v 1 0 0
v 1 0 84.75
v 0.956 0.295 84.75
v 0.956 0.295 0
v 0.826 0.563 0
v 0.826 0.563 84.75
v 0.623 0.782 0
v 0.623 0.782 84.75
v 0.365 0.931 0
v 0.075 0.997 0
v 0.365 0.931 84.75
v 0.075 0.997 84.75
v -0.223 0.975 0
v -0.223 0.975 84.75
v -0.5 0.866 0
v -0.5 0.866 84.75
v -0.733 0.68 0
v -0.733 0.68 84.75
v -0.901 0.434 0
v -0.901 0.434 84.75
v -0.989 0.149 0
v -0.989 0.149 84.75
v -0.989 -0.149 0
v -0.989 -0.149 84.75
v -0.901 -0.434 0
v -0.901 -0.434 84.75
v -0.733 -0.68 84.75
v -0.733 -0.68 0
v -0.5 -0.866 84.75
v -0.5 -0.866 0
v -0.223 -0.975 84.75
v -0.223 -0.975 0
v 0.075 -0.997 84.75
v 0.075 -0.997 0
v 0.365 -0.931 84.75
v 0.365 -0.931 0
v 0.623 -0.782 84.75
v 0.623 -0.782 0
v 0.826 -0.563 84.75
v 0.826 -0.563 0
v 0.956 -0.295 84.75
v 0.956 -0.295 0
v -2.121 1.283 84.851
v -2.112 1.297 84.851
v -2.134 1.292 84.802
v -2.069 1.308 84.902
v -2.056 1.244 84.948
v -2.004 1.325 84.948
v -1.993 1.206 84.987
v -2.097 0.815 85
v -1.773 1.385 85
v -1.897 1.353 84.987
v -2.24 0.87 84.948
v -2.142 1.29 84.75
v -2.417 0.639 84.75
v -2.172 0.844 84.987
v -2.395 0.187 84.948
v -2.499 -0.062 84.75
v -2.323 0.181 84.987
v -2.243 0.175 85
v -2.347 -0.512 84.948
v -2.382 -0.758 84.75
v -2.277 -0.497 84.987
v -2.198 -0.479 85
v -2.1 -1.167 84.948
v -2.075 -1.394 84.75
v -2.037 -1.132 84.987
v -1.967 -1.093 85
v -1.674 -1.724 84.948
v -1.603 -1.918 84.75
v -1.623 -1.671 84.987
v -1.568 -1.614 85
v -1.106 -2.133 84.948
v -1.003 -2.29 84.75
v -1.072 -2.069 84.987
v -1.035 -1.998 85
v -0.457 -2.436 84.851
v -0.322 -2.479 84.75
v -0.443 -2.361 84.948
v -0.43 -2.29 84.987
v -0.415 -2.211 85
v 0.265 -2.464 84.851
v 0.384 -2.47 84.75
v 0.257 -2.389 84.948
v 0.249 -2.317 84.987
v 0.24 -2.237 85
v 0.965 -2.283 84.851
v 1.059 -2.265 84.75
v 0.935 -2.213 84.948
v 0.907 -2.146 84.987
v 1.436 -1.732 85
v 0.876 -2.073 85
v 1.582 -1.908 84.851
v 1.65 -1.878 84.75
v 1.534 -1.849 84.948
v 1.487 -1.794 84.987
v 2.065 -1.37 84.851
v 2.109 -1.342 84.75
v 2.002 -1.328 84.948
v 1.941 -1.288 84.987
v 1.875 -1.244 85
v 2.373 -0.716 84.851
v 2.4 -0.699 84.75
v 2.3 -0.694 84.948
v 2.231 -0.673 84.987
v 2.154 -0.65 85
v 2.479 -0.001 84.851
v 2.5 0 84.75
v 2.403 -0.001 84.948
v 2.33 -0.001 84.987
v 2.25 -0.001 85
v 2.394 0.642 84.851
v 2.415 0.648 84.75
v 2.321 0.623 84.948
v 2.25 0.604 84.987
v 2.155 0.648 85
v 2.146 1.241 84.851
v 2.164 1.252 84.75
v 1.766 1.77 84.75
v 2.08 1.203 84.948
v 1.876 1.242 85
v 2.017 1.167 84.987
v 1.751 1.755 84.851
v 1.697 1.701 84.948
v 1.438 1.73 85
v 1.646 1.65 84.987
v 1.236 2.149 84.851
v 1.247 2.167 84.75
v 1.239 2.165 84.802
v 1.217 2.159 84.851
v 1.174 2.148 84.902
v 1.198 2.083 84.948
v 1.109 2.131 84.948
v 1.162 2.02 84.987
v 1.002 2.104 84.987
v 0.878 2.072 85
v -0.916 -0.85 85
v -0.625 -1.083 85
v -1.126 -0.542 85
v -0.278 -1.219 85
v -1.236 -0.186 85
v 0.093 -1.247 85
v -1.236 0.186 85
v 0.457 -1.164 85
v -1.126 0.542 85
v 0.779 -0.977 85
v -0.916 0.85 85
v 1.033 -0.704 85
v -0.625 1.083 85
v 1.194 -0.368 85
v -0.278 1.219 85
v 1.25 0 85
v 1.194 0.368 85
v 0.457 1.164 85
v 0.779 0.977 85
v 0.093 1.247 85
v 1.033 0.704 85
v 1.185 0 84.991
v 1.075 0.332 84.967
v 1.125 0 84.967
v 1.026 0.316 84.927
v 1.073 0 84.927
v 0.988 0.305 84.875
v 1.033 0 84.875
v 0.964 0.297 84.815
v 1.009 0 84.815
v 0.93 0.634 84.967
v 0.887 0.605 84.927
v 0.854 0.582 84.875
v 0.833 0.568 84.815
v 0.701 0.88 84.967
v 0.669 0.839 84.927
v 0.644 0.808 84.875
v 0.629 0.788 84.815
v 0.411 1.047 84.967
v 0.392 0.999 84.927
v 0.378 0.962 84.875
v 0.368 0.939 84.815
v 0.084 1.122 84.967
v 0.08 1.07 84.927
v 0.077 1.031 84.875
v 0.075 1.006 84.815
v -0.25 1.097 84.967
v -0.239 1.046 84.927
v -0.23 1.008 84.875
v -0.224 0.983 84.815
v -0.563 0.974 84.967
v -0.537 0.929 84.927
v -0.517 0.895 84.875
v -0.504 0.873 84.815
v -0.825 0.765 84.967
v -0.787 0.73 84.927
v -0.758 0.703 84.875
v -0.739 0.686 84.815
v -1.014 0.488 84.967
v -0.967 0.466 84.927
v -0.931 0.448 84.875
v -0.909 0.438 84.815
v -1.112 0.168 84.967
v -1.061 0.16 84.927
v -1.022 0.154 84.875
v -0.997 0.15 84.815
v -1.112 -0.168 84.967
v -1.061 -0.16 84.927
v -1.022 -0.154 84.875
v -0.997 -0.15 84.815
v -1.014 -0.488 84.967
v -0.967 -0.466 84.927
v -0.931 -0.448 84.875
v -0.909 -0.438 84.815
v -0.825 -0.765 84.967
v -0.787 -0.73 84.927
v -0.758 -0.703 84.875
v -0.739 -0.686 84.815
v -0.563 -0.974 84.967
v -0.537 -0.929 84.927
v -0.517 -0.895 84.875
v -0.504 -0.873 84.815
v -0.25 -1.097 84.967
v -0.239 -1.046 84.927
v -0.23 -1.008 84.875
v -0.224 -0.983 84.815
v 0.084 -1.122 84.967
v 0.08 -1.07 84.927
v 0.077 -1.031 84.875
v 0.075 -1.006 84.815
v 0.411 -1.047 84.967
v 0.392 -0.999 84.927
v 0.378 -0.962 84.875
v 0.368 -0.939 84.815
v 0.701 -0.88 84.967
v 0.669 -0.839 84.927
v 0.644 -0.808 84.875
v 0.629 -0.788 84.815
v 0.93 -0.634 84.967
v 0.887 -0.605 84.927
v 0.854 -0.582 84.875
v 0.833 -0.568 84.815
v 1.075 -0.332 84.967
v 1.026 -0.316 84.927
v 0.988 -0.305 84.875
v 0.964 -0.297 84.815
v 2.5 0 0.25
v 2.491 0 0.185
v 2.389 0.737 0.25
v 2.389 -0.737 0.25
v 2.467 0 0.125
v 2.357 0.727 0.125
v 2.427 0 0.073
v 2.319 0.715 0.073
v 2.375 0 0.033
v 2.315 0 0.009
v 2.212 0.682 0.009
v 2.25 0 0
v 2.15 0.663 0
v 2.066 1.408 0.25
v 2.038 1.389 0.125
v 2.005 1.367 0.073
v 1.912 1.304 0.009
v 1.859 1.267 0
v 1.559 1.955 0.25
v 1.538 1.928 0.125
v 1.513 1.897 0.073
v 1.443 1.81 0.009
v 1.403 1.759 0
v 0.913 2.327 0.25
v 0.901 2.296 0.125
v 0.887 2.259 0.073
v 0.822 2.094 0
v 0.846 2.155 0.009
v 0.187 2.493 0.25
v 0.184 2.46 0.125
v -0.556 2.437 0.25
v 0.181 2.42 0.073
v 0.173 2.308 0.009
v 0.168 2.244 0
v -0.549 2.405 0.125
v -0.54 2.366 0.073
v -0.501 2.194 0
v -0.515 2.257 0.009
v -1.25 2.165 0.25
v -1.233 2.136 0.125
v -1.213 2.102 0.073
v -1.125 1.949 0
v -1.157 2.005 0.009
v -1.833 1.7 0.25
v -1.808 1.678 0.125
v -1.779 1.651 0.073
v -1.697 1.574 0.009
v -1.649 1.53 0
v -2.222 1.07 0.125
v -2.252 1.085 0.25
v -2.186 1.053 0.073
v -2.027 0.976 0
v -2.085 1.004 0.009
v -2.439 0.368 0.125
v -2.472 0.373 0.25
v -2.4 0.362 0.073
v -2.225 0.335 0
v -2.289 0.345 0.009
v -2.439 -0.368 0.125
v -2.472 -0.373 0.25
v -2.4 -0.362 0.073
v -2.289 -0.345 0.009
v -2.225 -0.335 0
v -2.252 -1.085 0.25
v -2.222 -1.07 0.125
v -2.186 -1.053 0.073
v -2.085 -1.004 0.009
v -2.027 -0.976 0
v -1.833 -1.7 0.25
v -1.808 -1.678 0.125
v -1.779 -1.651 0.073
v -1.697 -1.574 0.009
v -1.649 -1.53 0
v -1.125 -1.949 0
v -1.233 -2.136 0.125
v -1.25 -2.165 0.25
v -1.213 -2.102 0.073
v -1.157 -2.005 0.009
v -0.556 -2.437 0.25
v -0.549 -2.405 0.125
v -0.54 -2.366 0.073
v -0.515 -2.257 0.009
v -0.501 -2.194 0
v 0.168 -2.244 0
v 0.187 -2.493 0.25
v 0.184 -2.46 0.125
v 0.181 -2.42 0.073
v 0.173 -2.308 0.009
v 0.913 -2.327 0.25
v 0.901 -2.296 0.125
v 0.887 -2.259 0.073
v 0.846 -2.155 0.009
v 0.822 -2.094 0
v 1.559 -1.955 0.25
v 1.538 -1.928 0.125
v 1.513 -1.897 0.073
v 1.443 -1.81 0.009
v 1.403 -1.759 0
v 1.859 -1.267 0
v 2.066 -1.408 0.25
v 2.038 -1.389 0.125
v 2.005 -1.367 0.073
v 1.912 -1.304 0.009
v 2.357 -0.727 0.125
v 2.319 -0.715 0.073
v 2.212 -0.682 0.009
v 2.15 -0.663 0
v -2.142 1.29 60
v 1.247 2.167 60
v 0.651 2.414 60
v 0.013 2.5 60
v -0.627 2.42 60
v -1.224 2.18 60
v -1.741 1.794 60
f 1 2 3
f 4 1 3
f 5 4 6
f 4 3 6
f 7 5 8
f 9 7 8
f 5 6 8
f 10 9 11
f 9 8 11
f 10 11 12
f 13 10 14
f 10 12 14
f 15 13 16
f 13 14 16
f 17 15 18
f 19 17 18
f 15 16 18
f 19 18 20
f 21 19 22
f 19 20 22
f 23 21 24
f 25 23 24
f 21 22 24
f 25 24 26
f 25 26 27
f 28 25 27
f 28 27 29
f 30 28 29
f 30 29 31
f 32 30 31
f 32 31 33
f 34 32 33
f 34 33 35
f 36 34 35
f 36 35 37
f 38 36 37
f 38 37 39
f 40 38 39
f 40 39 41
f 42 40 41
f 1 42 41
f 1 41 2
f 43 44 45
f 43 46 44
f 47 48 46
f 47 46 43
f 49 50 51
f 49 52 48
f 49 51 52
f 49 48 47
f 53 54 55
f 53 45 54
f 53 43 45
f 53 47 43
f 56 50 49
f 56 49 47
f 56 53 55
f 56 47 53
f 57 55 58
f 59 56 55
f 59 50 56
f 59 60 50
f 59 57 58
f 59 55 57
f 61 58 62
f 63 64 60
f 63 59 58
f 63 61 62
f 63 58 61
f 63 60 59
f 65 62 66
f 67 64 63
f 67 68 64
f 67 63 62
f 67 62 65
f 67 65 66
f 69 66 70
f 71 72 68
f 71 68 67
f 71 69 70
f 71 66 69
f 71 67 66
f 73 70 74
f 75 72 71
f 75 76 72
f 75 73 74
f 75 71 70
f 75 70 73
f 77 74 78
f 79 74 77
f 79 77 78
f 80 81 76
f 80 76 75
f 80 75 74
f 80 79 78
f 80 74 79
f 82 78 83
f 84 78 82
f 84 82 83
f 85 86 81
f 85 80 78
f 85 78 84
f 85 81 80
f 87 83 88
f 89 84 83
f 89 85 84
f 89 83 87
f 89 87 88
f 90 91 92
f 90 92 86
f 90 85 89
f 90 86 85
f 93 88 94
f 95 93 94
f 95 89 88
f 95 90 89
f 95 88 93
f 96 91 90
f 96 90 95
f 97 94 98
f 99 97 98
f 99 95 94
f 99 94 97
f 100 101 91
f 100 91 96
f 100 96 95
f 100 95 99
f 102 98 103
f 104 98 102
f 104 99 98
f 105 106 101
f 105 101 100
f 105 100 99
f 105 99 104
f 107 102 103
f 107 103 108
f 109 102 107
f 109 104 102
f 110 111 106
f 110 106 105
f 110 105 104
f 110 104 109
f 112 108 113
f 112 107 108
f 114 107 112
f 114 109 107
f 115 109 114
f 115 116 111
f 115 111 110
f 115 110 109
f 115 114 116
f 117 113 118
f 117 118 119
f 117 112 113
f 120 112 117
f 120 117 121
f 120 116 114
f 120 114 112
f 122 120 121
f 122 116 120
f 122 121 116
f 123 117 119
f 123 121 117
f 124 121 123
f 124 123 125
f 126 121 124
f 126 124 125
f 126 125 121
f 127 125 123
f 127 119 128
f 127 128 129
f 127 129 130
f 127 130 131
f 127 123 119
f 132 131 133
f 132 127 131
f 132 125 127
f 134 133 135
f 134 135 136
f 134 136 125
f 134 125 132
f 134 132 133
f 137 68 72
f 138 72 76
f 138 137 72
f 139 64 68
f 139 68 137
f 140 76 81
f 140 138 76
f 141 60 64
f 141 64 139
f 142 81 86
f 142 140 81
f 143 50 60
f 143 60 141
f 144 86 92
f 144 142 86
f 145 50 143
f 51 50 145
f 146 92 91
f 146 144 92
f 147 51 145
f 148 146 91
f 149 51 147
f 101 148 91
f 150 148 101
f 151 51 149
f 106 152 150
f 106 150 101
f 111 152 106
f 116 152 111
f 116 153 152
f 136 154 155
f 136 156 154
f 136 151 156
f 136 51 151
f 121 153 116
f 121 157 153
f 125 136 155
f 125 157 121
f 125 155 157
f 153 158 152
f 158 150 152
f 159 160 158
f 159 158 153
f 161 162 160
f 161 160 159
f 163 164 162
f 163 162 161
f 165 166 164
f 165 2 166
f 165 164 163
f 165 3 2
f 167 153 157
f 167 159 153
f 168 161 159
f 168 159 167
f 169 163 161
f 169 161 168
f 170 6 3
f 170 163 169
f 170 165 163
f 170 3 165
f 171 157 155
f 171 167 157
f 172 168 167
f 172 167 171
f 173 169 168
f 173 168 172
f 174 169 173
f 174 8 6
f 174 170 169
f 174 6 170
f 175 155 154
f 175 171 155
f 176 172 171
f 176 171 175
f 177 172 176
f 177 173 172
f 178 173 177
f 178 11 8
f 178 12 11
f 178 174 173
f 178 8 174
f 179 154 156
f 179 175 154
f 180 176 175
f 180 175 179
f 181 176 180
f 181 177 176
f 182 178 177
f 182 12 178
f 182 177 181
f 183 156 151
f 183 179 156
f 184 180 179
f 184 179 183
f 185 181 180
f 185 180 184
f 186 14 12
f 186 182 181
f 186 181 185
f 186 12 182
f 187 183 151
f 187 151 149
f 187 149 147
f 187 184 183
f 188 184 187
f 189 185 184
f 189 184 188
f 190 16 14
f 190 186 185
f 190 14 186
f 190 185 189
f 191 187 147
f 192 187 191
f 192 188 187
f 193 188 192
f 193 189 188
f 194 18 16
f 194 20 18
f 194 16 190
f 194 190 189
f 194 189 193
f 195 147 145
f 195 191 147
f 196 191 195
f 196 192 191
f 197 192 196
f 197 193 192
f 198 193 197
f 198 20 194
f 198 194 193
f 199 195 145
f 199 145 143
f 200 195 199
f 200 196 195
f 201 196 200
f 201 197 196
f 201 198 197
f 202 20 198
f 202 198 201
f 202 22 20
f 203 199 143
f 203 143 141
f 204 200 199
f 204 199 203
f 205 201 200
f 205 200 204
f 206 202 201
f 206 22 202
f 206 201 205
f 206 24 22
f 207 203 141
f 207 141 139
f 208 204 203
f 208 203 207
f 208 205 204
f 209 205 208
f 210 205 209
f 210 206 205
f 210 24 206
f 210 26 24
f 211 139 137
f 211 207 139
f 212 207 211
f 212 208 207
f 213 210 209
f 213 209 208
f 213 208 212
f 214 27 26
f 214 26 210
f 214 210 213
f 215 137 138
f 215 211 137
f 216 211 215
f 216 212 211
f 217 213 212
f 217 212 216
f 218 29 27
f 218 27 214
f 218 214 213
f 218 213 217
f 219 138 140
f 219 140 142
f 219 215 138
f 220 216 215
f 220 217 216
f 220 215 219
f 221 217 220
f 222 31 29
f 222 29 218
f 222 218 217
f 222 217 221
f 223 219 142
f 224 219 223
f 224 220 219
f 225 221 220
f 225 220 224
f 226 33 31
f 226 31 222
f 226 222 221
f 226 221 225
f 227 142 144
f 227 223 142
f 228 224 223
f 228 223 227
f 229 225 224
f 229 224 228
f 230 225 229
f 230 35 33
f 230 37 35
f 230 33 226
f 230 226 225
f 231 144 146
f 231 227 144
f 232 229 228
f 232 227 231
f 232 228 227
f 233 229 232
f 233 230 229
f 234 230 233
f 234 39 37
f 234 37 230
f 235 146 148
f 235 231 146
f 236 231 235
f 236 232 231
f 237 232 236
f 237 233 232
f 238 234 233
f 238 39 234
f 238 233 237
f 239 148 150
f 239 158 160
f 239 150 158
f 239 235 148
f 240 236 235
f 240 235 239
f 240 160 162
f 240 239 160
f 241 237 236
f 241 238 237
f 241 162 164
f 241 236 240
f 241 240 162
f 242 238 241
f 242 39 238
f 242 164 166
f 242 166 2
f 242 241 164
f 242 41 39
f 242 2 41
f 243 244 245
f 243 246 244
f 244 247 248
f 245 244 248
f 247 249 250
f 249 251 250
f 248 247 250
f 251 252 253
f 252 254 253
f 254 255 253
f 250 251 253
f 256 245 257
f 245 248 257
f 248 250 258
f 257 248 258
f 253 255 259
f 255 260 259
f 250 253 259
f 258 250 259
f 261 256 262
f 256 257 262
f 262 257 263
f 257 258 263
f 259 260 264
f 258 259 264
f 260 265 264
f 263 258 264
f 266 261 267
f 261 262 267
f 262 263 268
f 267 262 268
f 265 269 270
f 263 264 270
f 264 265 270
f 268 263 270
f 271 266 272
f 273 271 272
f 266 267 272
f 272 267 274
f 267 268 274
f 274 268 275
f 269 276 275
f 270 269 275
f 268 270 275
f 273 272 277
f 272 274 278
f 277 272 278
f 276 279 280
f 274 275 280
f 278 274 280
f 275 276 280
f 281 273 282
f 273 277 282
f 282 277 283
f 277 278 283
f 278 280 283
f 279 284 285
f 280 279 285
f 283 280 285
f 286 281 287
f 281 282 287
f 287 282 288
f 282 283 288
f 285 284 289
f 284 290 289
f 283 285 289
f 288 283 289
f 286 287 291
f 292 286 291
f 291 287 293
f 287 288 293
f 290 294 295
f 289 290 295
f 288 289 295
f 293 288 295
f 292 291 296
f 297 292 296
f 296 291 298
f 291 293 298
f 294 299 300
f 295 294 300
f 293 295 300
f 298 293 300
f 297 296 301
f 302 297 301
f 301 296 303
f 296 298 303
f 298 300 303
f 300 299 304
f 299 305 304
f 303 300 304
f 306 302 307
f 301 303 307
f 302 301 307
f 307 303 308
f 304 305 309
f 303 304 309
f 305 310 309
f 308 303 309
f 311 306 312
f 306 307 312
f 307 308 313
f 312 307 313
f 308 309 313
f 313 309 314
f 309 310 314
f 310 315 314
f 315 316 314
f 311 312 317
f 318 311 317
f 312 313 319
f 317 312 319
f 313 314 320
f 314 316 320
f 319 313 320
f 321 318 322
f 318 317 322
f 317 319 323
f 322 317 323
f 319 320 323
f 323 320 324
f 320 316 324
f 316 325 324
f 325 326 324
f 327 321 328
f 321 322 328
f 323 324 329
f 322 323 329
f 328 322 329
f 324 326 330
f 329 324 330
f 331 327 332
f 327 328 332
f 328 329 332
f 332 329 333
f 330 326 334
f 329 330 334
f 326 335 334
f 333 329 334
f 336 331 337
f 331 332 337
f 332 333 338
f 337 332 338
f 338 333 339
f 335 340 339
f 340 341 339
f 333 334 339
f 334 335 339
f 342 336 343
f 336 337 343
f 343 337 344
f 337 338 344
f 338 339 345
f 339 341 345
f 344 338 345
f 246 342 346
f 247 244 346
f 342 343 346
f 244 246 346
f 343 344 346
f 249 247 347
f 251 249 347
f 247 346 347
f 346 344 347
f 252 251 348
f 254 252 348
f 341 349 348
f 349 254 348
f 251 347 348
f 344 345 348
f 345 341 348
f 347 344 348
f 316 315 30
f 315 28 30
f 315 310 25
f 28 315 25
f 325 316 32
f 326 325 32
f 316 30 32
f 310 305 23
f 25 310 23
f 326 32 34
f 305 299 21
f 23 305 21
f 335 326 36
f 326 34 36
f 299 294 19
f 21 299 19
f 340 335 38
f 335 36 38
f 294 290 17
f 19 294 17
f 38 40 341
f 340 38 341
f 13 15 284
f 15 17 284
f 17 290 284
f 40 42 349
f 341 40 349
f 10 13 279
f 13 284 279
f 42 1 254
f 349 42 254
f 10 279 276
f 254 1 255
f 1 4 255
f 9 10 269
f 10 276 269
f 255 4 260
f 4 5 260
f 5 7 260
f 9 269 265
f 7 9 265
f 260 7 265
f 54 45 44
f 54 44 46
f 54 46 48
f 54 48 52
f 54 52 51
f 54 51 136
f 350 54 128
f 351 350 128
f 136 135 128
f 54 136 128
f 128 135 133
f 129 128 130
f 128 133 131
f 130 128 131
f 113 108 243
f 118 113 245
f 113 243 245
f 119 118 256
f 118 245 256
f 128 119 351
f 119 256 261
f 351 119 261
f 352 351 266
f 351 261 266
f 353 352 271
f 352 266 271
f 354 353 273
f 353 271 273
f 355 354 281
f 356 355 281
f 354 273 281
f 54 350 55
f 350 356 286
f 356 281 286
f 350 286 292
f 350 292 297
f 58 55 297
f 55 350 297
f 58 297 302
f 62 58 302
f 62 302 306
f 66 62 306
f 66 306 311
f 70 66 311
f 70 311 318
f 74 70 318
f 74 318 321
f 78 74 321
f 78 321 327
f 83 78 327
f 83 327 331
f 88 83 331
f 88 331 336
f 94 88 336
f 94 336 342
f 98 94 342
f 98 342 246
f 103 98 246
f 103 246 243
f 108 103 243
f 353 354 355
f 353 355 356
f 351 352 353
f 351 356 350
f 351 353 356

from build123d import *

# Parameters (mm, degrees)
CROQUIS1_R              = 2.5
SALIENTE_EXTRUIR1_DEPTH = 85
CROQUIS2_R              = 1
CORTAR_EXTRUIR1_DEPTH   = 86
REDONDEO1_R             = 0.25
ENL_V_MAT_EXTRU_1_DEPTH = 25


with BuildPart() as part:
    # Croquis1 → Saliente-Extruir1 (new body)
    with BuildSketch(Plane.XY):
        Circle(CROQUIS1_R)
    extrude(amount=SALIENTE_EXTRUIR1_DEPTH)

    # Croquis2 → Cortar-Extruir1 (cut, through all)
    with BuildSketch(Plane.XY.offset(85)):
        Circle(CROQUIS2_R)
    extrude(amount=-CORTAR_EXTRUIR1_DEPTH, mode=Mode.SUBTRACT)

    # Redondeo1
    redondeo1_edges = [part.edges().sort_by_distance(p)[0] for p in [
        (-2.5, 0, 0),
        (-2.5, 0, 85),
        (-1, 0, 85),
    ]]
    fillet(redondeo1_edges, radius=REDONDEO1_R)

    # Esquisse1 → Enlèv. mat.-Extru.1 (cut)
    with BuildSketch(Plane.XY.offset(85)):
        with BuildLine():
            Line((-2.141675568, 1.289661103), (1.246569633, 2.167040413))
            ThreePointArc((1.246569633, 2.167040413), (-0.626699507, 2.420175144), (-2.141675568, 1.289661103))
        make_face()
    extrude(amount=-ENL_V_MAT_EXTRU_1_DEPTH, mode=Mode.SUBTRACT)


solid = part.part
